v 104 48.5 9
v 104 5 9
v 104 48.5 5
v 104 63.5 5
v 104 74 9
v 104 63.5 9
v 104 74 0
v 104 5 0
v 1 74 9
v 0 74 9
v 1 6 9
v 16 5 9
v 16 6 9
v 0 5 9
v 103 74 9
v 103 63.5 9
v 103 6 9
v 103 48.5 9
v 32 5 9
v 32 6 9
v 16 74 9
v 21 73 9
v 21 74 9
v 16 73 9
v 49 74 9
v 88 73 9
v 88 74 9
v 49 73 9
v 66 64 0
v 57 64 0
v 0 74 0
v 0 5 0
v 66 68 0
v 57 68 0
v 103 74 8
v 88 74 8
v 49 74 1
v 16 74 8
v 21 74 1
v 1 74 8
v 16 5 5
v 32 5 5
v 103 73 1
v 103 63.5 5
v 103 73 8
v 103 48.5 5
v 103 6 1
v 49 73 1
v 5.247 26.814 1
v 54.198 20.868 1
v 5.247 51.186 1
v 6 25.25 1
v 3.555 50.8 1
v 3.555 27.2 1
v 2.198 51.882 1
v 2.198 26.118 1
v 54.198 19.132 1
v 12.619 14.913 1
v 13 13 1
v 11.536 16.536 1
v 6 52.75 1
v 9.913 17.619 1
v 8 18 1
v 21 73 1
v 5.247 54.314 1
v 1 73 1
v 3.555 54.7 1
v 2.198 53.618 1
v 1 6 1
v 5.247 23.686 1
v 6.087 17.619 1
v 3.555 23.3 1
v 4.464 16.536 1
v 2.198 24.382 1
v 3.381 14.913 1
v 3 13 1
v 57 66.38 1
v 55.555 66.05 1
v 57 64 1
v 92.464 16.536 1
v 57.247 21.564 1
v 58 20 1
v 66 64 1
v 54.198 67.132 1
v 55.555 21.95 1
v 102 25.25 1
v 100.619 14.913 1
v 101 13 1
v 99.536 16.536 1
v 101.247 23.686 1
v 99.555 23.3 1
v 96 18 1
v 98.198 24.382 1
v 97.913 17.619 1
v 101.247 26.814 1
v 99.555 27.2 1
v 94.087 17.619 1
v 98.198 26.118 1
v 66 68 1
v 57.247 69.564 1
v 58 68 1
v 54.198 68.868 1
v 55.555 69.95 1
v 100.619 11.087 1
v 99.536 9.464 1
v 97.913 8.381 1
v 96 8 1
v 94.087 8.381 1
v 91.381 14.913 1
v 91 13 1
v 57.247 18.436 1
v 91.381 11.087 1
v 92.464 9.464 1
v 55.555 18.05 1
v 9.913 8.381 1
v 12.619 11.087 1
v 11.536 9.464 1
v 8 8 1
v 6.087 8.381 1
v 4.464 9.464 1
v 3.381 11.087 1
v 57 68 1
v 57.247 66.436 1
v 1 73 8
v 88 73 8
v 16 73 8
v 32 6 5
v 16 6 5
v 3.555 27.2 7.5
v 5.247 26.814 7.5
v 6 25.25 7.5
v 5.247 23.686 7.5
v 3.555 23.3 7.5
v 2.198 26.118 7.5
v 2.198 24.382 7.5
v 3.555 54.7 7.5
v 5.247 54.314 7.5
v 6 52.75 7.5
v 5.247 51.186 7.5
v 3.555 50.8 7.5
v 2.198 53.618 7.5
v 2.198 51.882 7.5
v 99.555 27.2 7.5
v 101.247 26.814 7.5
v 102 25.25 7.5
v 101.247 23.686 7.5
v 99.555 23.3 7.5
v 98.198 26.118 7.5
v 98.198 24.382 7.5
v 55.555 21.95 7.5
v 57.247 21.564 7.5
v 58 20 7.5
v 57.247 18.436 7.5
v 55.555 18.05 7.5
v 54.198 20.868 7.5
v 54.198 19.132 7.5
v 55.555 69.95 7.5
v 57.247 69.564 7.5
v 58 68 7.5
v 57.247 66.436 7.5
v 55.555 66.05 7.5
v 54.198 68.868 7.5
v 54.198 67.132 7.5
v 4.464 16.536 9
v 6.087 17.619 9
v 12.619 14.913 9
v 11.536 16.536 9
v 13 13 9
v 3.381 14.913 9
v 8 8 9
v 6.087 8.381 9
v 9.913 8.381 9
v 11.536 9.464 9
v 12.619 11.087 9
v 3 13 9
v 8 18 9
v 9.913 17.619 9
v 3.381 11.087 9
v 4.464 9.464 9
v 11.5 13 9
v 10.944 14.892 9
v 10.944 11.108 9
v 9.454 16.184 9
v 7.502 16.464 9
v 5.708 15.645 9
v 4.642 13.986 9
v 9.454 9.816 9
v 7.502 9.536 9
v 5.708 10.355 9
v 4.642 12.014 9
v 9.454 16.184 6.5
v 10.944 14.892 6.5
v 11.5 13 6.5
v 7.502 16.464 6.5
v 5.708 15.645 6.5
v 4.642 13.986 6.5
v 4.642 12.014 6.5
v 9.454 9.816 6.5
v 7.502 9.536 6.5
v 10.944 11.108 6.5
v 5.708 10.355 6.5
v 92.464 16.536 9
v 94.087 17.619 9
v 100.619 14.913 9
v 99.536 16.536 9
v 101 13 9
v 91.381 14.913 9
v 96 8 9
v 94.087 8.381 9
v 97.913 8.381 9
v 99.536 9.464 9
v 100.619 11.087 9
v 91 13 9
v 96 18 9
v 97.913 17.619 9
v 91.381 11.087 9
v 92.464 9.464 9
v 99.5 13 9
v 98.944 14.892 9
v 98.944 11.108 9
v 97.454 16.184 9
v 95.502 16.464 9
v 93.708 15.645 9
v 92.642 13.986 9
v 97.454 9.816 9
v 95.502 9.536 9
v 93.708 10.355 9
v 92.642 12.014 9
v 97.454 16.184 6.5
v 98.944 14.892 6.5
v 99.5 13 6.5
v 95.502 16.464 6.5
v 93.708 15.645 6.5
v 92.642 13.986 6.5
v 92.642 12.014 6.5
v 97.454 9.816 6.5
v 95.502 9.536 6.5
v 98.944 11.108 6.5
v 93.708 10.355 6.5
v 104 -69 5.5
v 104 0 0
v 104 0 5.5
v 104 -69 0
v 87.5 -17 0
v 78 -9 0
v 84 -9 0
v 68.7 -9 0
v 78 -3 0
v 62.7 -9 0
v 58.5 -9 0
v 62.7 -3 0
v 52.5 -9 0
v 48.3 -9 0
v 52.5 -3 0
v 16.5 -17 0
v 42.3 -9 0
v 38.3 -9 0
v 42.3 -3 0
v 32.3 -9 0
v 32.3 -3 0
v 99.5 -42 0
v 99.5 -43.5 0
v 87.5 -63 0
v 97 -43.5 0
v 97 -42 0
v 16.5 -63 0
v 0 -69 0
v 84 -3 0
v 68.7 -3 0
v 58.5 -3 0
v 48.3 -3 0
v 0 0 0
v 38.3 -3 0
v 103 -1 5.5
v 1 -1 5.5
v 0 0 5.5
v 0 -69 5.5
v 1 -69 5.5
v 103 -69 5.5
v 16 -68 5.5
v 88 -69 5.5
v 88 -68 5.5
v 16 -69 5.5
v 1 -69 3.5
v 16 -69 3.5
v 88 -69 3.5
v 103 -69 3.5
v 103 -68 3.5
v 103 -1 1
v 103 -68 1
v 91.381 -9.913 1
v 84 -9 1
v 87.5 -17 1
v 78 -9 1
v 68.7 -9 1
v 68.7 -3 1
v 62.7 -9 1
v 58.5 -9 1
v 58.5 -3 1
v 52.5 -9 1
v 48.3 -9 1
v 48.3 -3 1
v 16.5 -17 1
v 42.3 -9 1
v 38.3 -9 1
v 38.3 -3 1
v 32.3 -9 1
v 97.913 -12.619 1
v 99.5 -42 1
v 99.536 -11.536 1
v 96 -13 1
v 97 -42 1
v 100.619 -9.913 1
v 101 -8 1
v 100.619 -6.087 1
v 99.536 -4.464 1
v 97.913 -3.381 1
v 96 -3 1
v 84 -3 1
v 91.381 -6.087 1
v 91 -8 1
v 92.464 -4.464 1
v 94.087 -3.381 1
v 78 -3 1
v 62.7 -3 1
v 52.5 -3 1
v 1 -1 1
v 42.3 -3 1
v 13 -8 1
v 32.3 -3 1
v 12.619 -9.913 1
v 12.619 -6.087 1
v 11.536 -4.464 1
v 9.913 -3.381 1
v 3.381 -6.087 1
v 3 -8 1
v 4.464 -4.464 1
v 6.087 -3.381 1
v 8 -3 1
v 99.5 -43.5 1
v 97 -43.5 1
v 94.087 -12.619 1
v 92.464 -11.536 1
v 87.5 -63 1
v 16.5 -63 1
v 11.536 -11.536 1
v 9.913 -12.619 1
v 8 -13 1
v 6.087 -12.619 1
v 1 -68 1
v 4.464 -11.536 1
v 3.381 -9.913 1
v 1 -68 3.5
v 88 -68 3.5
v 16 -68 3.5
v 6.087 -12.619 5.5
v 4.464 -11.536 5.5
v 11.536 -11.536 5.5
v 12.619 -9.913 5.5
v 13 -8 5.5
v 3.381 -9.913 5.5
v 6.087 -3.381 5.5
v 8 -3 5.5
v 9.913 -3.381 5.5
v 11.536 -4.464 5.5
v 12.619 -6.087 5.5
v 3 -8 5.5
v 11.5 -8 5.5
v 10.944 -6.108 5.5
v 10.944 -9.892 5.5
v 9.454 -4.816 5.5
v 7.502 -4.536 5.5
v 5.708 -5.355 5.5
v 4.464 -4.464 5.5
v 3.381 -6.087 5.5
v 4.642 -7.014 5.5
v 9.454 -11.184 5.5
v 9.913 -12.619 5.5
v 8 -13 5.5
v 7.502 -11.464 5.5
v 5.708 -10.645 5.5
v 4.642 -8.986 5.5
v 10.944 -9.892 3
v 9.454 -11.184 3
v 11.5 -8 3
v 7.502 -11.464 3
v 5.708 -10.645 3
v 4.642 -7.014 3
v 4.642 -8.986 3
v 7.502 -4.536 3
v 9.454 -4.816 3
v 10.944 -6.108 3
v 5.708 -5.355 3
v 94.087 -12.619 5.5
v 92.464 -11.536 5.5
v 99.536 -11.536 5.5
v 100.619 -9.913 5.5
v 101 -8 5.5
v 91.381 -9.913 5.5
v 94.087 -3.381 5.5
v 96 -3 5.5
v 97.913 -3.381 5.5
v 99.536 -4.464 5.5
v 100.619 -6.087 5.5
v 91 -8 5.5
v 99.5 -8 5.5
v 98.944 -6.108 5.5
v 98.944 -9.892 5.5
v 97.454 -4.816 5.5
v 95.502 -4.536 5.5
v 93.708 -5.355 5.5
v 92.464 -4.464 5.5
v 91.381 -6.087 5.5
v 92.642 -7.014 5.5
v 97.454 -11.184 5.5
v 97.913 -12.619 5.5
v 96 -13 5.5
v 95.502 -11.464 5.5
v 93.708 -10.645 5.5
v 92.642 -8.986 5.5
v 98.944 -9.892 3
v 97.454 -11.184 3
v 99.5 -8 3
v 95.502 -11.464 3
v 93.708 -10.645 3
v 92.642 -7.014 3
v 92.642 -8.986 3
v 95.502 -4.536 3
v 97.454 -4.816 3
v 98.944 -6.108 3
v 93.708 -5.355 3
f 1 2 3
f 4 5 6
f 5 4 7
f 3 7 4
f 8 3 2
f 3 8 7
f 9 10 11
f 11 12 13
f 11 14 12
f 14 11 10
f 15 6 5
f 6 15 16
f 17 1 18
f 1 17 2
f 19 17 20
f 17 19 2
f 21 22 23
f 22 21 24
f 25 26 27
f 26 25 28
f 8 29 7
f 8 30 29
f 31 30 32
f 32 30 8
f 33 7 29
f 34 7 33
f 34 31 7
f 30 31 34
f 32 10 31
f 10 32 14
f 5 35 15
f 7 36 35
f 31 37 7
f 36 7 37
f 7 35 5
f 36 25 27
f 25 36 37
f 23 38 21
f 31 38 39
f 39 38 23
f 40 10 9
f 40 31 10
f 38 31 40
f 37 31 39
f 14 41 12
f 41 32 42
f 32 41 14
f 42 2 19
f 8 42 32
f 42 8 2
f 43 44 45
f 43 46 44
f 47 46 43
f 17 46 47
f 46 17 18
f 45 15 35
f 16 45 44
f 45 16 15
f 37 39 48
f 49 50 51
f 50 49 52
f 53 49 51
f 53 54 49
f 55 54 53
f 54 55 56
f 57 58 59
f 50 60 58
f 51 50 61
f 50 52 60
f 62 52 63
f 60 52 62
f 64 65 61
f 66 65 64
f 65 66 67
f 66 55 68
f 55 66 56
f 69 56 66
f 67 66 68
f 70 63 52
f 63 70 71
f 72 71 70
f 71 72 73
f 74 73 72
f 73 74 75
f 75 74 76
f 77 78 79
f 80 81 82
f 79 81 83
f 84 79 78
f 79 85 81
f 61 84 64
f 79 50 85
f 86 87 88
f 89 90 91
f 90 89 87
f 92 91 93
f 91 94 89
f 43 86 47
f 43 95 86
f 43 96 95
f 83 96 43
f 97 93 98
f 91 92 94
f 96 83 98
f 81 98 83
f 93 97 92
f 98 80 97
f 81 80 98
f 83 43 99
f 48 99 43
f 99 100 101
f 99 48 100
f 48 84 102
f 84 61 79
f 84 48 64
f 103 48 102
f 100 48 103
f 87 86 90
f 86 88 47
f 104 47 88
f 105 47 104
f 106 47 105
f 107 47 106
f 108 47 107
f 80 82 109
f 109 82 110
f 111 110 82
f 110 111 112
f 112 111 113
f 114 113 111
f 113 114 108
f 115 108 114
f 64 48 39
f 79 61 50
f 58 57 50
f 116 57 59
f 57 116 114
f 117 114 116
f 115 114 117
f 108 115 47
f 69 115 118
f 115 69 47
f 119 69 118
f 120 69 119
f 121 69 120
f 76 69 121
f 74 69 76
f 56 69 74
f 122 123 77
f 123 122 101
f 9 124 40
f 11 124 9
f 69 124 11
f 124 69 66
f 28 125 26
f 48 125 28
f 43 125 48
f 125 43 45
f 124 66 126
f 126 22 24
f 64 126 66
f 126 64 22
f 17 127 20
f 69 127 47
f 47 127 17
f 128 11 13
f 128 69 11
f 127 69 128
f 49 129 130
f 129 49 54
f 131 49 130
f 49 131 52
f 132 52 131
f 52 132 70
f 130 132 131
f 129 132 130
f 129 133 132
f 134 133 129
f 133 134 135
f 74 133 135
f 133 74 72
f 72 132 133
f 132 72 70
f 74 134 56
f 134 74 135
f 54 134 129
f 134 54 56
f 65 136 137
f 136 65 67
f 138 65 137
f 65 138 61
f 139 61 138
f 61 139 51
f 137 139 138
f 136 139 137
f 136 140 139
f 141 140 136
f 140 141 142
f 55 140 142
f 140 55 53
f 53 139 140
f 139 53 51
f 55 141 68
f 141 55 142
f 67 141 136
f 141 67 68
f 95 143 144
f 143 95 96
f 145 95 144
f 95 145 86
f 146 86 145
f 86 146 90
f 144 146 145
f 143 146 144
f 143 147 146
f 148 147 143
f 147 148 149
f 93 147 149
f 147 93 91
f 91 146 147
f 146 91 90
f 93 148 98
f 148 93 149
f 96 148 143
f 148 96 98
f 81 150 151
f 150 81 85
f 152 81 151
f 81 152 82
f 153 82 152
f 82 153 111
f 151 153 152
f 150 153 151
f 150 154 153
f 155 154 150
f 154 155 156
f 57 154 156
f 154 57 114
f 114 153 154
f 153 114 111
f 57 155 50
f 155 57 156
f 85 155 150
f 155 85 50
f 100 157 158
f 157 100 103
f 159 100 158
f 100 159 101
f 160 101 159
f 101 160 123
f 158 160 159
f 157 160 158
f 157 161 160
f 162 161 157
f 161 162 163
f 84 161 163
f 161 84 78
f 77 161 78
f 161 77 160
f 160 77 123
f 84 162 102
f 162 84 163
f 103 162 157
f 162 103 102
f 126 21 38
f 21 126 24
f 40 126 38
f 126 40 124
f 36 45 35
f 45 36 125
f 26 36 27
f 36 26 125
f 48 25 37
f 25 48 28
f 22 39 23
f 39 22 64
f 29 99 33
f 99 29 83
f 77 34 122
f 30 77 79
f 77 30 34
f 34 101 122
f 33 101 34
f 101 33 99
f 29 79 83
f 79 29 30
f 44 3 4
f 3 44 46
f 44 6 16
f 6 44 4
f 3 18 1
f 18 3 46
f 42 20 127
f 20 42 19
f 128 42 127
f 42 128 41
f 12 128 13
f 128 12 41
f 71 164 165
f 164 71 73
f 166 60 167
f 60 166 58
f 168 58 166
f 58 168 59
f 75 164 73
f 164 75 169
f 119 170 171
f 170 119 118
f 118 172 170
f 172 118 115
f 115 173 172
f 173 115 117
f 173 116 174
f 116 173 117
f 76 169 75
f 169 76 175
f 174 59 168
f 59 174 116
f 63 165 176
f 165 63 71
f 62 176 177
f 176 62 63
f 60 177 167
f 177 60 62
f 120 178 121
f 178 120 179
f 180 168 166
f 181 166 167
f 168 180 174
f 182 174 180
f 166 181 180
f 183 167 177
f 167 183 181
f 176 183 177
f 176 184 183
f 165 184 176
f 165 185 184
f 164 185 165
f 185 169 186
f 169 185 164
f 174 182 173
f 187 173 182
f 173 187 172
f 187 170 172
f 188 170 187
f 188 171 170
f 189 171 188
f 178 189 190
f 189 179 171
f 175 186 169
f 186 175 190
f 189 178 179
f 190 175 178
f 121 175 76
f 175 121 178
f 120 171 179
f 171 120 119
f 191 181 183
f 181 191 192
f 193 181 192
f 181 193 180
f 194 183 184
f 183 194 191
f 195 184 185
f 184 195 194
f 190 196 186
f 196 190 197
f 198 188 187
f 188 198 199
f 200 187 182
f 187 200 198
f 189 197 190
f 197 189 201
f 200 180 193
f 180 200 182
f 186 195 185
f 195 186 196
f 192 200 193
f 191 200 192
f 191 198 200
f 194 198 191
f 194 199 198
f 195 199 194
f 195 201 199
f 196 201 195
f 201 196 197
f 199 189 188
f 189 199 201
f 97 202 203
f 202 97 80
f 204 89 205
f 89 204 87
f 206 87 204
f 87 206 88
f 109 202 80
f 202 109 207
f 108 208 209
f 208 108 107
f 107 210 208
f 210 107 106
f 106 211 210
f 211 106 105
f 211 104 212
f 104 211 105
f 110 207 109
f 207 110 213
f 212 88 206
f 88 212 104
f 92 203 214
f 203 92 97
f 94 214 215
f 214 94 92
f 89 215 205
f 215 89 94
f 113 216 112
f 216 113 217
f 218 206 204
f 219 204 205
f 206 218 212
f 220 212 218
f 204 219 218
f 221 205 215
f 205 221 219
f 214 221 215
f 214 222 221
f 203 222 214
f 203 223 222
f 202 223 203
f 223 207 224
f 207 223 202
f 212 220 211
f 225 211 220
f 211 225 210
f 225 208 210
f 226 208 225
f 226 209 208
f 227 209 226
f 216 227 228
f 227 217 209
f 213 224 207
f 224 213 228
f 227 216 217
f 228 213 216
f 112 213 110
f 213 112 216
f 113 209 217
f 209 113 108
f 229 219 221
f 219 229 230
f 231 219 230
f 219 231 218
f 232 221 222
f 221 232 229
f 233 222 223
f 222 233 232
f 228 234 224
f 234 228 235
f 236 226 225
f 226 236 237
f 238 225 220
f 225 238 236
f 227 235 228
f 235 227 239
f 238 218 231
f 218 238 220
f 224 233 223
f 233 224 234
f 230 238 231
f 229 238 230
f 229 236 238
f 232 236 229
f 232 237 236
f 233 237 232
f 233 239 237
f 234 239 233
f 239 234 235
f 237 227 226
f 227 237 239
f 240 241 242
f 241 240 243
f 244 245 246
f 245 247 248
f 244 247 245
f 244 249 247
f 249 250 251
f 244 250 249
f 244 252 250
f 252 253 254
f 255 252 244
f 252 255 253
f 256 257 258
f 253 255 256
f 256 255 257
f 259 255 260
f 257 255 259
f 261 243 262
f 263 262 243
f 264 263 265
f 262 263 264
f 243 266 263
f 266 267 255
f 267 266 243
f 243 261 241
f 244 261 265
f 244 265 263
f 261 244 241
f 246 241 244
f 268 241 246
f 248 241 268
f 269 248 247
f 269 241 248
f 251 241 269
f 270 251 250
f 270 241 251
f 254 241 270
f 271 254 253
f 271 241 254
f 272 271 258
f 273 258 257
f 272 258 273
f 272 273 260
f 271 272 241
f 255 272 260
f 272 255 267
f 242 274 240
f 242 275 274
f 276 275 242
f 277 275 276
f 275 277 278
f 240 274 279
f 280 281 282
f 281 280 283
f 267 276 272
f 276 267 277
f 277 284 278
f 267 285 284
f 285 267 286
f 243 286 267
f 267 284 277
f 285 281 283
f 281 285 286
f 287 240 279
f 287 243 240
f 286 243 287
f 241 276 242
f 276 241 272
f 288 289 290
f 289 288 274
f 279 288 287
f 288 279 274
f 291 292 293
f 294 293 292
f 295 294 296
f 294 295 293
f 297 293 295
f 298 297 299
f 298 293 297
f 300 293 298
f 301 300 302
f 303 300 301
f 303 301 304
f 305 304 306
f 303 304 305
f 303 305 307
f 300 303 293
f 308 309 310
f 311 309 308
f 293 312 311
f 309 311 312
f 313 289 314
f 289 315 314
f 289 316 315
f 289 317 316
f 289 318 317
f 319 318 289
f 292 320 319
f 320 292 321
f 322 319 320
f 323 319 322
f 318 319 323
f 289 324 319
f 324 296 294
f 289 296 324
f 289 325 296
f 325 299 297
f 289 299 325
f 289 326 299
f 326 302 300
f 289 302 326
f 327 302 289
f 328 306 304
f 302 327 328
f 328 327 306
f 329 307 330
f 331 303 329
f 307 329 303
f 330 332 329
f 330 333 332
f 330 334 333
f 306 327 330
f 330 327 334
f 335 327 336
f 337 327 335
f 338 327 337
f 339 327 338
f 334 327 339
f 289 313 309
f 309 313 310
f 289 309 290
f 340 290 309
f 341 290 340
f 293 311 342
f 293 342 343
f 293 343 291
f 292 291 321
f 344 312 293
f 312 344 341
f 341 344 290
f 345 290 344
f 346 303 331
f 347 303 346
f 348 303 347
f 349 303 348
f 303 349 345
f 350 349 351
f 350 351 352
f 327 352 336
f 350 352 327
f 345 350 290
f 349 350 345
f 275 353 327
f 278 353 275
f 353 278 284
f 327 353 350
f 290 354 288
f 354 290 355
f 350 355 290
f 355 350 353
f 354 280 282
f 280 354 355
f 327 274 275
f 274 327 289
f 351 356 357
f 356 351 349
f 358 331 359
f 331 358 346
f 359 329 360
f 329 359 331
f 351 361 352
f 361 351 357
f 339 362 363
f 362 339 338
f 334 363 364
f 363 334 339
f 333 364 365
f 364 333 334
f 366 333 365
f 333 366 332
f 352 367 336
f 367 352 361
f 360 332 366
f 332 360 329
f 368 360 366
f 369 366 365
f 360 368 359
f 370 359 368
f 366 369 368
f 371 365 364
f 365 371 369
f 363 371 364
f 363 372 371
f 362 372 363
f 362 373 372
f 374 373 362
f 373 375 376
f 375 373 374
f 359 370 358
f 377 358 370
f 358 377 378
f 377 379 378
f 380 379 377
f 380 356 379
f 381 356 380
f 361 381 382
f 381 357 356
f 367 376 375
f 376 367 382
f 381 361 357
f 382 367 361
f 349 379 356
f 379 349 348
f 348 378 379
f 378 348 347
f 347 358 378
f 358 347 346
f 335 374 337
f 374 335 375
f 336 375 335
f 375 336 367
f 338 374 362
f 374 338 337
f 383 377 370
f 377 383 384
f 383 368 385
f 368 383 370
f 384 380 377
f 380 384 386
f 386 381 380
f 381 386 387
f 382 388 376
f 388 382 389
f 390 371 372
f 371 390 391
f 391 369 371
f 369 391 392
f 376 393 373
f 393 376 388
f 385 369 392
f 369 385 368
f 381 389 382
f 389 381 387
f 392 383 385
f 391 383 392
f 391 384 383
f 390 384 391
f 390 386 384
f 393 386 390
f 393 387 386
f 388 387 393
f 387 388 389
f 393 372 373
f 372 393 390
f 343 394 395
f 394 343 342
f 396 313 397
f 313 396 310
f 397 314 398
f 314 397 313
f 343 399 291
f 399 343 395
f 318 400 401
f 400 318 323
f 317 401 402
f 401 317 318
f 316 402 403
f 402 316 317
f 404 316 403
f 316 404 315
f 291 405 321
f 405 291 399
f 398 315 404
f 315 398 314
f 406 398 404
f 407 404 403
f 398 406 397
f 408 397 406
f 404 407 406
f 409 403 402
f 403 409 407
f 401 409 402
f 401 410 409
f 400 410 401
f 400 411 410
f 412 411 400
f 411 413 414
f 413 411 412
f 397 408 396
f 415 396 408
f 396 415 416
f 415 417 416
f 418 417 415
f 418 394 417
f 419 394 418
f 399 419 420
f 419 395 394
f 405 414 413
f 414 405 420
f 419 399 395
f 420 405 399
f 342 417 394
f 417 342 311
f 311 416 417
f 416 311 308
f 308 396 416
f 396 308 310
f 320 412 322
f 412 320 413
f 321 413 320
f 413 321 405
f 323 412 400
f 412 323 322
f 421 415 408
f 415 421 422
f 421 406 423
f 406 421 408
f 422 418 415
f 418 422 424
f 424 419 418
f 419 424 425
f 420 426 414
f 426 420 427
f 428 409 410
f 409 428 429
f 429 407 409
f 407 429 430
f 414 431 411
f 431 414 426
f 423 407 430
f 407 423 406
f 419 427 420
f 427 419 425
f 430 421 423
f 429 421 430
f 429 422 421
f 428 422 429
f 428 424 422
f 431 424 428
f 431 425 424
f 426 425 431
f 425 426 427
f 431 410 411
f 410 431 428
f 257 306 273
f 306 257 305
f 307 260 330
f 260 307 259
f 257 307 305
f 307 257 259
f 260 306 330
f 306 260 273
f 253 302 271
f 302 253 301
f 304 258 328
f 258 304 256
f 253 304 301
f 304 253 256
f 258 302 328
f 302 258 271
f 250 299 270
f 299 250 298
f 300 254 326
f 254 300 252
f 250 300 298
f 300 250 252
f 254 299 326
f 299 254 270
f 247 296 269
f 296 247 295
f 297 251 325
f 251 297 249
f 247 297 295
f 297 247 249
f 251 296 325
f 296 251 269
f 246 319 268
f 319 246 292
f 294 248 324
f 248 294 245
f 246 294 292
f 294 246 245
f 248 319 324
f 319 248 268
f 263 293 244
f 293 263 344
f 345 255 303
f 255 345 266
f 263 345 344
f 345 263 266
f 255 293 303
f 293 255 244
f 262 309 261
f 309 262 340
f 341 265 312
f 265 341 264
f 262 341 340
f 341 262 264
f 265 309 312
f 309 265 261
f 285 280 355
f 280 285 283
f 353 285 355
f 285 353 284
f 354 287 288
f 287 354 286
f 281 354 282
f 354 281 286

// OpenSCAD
/*
** File:		badger_case.scad
** Author:	Melody Bliss <melody@melodybliss.org>
** Purpose:
**	This is a case for the BADGEr_v4.1 eInk badge from Seeedstudio
** at http://www.seeedstudio.com/depot/badgerv4-p-1587.html
**
** This uses 1/4" x 1/16" neodymium magnets to hold the front and rear covers together.
*/

board_thickness=1.5;			// How thick is the board
badger_width=102;			// Width of the badger_v4.1
badger_height=67;			// Height of the badger (not including the "ears")
case_width=badger_width + 2;	// badger_width + 2mm
case_height=badger_height + 2;	// badger_height + 2mm
back_depth=8;				// How deep is the back case portion?
case_depth=1;				// depth of the case
ear_width=15;				// width of "ears" (badge holder section)
ear_height=15;				// height of "ears"
ear_thickness=board_thickness + .5;			// how thick are the ears? Make it .5 thicker to compenstate
mh_diameter=3;				// diameter of mounting holes
mh_diameter=4;				// diameter of mounting holes
battery_width=28;			// Width of battery compartment
battery_height=25;			// battery height
battery_start=20;			// Start of the battery location (X)
battery_depth=8;
power_start=56;				// Power start location
power_width=9;				// width of the power switch
power_height=4;				// Power switch height
power_y=58;					// Power Y location
uSD_Y=42.5;					// microSD slot start (Y)
uSD_height=15;				// height of uSD slot
uSD_width=17.5;				// width of uSD slot
uSD_depth=4;					// uSD depth

magnet_width=7;				// 1/4"
magnet_depth=2.5;			// 1/16"
magnet_border=1.5;			// thickness of the border around the magnet

display_width=71;			// width of the display
display_height=46;			// height of the display
display_X=16.5;				// X start of the display
display_Y=17;				// Y start of the display
button_size=6;				// size of the buttons
button_depth=6.5;			// depth of the buttons
button_Y=3;					// button Y location
button_X=[32.3, 42.3, 52.5, 62.7, 78];	// X locations of the buttons
top_depth=4.5;

header_width=16;				// Width of the headers on the bottom
header_length=10;
header_depth=4;
header_X=15;					// X start of the header

led_X = case_width - ((case_width - badger_width)/2) - 6.0;
led_Y=42;
led_width=2.5;
led_height=1.5;

module case_back_no_ears()
{
	difference()
	{
		cube([case_width, case_height, back_depth + case_depth]);
		translate([(case_width - badger_width)/2, (case_height - badger_height) / 2, case_depth])
			cube([badger_width, badger_height, back_depth]);
	}

	// For each mount home, make the length just shy of the true thickness of the back allowing the board to
	// rest on the hole
	// first mount hole - left side
	translate([((case_width - badger_width)/2) + 3, 20.25, 0])
		cylinder(r=mh_diameter/2, h=back_depth + case_depth - board_thickness);
	// second mount hole - left side
	translate([((case_width - badger_width)/2) + 3, 47.75, 0])
		cylinder(r=mh_diameter/2, h=back_depth + case_depth - board_thickness);
	// third mount hole - first right side
	translate([case_width - ((case_width - badger_width)/2 + 3), 20.25, 0])
		cylinder(r=mh_diameter/2, h=back_depth + case_depth - board_thickness);

	// fourth mount hole - middle just below display
	translate([case_width - ((case_width - badger_width)/2 + 47), 15, 0])
		cylinder(r=mh_diameter/2, h=back_depth + case_depth - board_thickness);

	// fifth mount hole - middle just above display
	translate([case_width - ((case_width - badger_width)/2 + 47), 63, 0])
		cylinder(r=mh_diameter/2, h=back_depth + case_depth - board_thickness);
}

module case_back()
{
	difference()
	{
		case_back_no_ears();
		// left "ear"
		translate([(case_width - badger_width) / 2, badger_height, back_depth])
			cube([ear_width, ear_height, ear_thickness]);
		// right "ear"
		translate([case_width - ((case_width - badger_width) / 2) - ear_width, badger_height, back_depth])
			cube([ear_width, ear_height, ear_thickness]);
		// battery opening
		translate([battery_start + ((case_width - badger_width)/2), badger_height, case_depth])
			cube([battery_width, battery_height, battery_depth]);
		// Power switch opening
		translate([power_start + ((case_width - badger_width)/2), power_y + ((case_height - badger_height)/2), 0])
			cube([power_width, power_height, case_depth]);
		// uSD slot opening
		translate([badger_width, uSD_Y + ((case_height - badger_height)/2), back_depth + case_depth - uSD_depth])
		cube([uSD_width, uSD_height, uSD_depth]);

		// header opening
		translate([((case_width - badger_width)/2) + header_X, 0, back_depth + case_depth - header_depth])
			cube([header_width, header_length, header_depth]);
}
	
	// bottom left magnet
	translate([((case_width - badger_width)/2) + magnet_width, 
			   ((case_height - badger_height)/2) + magnet_width, 
				0])
	difference()
	{
			cylinder(r=(magnet_width/2) + magnet_border, h=back_depth+case_depth);
			translate([0,0, back_depth + case_depth - magnet_depth])
				cylinder(r=(magnet_width/2), h = magnet_depth);
	}
	// bottom right magnet
	translate([case_width - ((case_width - badger_width)/2) - magnet_width, 
			   ((case_height - badger_height)/2) + magnet_width, 
				0])
	difference()
	{
			cylinder(r=(magnet_width/2) + magnet_border, h=back_depth+case_depth);
			translate([0,0, back_depth + case_depth - magnet_depth])
				cylinder(r=(magnet_width/2), h = magnet_depth);
	}
}

module case_top_with_magnets()
{
	difference()
	{
		cube([case_width, case_height, top_depth + case_depth]);
		translate([(case_width - badger_width)/2, (case_height - badger_height) / 2, 0])
			cube([badger_width, badger_height, top_depth]);
	}

	// bottom left magnet
	translate([((case_width - badger_width)/2) + magnet_width, 
			   ((case_height - badger_height)/2) + magnet_width, 
				0])
	difference()
	{
			cylinder(r=(magnet_width/2) + magnet_border, h=top_depth+case_depth);
				cylinder(r=(magnet_width/2), h = magnet_depth);
	}

	// bottom right magnet
	translate([case_width - ((case_width - badger_width)/2) - magnet_width, 
			   ((case_height - badger_height)/2) + magnet_width, 
				0])
	difference()
	{
			cylinder(r=(magnet_width/2) + magnet_border, h=top_depth+case_depth);
				cylinder(r=(magnet_width/2), h = magnet_depth);
	}

}

module case_top()
{
	difference()
	{
		case_top_with_magnets();
		// Display opening
		translate([display_X, display_Y, 0])
		cube([display_width, display_height, top_depth + case_depth]);

		// Button openings
		for(bx = button_X)
		{
			echo(str("bx=",bx));
			translate([bx, button_Y, 0])
				cube([button_size, button_size, top_depth + case_depth]);
		}

		// led opening
		translate([led_X, led_Y, 0])
			cube([led_width, led_height, top_depth + case_depth]);

		// left "ear"
		translate([(case_width - badger_width) / 2, badger_height, 0])
			cube([ear_width, ear_height, ear_thickness]);
		// right "ear"
		translate([case_width - ((case_width - badger_width) / 2) - ear_width, badger_height, 0])
			cube([ear_width, ear_height, ear_thickness]);

	}
}

// Generate Back of the case. Shift by 5 so the two case halves aren't touching
translate([0,5,0])
	case_back();

// Generate front of the case

translate([0, 0, top_depth + case_depth]) rotate([180,0,0])
	case_top();
